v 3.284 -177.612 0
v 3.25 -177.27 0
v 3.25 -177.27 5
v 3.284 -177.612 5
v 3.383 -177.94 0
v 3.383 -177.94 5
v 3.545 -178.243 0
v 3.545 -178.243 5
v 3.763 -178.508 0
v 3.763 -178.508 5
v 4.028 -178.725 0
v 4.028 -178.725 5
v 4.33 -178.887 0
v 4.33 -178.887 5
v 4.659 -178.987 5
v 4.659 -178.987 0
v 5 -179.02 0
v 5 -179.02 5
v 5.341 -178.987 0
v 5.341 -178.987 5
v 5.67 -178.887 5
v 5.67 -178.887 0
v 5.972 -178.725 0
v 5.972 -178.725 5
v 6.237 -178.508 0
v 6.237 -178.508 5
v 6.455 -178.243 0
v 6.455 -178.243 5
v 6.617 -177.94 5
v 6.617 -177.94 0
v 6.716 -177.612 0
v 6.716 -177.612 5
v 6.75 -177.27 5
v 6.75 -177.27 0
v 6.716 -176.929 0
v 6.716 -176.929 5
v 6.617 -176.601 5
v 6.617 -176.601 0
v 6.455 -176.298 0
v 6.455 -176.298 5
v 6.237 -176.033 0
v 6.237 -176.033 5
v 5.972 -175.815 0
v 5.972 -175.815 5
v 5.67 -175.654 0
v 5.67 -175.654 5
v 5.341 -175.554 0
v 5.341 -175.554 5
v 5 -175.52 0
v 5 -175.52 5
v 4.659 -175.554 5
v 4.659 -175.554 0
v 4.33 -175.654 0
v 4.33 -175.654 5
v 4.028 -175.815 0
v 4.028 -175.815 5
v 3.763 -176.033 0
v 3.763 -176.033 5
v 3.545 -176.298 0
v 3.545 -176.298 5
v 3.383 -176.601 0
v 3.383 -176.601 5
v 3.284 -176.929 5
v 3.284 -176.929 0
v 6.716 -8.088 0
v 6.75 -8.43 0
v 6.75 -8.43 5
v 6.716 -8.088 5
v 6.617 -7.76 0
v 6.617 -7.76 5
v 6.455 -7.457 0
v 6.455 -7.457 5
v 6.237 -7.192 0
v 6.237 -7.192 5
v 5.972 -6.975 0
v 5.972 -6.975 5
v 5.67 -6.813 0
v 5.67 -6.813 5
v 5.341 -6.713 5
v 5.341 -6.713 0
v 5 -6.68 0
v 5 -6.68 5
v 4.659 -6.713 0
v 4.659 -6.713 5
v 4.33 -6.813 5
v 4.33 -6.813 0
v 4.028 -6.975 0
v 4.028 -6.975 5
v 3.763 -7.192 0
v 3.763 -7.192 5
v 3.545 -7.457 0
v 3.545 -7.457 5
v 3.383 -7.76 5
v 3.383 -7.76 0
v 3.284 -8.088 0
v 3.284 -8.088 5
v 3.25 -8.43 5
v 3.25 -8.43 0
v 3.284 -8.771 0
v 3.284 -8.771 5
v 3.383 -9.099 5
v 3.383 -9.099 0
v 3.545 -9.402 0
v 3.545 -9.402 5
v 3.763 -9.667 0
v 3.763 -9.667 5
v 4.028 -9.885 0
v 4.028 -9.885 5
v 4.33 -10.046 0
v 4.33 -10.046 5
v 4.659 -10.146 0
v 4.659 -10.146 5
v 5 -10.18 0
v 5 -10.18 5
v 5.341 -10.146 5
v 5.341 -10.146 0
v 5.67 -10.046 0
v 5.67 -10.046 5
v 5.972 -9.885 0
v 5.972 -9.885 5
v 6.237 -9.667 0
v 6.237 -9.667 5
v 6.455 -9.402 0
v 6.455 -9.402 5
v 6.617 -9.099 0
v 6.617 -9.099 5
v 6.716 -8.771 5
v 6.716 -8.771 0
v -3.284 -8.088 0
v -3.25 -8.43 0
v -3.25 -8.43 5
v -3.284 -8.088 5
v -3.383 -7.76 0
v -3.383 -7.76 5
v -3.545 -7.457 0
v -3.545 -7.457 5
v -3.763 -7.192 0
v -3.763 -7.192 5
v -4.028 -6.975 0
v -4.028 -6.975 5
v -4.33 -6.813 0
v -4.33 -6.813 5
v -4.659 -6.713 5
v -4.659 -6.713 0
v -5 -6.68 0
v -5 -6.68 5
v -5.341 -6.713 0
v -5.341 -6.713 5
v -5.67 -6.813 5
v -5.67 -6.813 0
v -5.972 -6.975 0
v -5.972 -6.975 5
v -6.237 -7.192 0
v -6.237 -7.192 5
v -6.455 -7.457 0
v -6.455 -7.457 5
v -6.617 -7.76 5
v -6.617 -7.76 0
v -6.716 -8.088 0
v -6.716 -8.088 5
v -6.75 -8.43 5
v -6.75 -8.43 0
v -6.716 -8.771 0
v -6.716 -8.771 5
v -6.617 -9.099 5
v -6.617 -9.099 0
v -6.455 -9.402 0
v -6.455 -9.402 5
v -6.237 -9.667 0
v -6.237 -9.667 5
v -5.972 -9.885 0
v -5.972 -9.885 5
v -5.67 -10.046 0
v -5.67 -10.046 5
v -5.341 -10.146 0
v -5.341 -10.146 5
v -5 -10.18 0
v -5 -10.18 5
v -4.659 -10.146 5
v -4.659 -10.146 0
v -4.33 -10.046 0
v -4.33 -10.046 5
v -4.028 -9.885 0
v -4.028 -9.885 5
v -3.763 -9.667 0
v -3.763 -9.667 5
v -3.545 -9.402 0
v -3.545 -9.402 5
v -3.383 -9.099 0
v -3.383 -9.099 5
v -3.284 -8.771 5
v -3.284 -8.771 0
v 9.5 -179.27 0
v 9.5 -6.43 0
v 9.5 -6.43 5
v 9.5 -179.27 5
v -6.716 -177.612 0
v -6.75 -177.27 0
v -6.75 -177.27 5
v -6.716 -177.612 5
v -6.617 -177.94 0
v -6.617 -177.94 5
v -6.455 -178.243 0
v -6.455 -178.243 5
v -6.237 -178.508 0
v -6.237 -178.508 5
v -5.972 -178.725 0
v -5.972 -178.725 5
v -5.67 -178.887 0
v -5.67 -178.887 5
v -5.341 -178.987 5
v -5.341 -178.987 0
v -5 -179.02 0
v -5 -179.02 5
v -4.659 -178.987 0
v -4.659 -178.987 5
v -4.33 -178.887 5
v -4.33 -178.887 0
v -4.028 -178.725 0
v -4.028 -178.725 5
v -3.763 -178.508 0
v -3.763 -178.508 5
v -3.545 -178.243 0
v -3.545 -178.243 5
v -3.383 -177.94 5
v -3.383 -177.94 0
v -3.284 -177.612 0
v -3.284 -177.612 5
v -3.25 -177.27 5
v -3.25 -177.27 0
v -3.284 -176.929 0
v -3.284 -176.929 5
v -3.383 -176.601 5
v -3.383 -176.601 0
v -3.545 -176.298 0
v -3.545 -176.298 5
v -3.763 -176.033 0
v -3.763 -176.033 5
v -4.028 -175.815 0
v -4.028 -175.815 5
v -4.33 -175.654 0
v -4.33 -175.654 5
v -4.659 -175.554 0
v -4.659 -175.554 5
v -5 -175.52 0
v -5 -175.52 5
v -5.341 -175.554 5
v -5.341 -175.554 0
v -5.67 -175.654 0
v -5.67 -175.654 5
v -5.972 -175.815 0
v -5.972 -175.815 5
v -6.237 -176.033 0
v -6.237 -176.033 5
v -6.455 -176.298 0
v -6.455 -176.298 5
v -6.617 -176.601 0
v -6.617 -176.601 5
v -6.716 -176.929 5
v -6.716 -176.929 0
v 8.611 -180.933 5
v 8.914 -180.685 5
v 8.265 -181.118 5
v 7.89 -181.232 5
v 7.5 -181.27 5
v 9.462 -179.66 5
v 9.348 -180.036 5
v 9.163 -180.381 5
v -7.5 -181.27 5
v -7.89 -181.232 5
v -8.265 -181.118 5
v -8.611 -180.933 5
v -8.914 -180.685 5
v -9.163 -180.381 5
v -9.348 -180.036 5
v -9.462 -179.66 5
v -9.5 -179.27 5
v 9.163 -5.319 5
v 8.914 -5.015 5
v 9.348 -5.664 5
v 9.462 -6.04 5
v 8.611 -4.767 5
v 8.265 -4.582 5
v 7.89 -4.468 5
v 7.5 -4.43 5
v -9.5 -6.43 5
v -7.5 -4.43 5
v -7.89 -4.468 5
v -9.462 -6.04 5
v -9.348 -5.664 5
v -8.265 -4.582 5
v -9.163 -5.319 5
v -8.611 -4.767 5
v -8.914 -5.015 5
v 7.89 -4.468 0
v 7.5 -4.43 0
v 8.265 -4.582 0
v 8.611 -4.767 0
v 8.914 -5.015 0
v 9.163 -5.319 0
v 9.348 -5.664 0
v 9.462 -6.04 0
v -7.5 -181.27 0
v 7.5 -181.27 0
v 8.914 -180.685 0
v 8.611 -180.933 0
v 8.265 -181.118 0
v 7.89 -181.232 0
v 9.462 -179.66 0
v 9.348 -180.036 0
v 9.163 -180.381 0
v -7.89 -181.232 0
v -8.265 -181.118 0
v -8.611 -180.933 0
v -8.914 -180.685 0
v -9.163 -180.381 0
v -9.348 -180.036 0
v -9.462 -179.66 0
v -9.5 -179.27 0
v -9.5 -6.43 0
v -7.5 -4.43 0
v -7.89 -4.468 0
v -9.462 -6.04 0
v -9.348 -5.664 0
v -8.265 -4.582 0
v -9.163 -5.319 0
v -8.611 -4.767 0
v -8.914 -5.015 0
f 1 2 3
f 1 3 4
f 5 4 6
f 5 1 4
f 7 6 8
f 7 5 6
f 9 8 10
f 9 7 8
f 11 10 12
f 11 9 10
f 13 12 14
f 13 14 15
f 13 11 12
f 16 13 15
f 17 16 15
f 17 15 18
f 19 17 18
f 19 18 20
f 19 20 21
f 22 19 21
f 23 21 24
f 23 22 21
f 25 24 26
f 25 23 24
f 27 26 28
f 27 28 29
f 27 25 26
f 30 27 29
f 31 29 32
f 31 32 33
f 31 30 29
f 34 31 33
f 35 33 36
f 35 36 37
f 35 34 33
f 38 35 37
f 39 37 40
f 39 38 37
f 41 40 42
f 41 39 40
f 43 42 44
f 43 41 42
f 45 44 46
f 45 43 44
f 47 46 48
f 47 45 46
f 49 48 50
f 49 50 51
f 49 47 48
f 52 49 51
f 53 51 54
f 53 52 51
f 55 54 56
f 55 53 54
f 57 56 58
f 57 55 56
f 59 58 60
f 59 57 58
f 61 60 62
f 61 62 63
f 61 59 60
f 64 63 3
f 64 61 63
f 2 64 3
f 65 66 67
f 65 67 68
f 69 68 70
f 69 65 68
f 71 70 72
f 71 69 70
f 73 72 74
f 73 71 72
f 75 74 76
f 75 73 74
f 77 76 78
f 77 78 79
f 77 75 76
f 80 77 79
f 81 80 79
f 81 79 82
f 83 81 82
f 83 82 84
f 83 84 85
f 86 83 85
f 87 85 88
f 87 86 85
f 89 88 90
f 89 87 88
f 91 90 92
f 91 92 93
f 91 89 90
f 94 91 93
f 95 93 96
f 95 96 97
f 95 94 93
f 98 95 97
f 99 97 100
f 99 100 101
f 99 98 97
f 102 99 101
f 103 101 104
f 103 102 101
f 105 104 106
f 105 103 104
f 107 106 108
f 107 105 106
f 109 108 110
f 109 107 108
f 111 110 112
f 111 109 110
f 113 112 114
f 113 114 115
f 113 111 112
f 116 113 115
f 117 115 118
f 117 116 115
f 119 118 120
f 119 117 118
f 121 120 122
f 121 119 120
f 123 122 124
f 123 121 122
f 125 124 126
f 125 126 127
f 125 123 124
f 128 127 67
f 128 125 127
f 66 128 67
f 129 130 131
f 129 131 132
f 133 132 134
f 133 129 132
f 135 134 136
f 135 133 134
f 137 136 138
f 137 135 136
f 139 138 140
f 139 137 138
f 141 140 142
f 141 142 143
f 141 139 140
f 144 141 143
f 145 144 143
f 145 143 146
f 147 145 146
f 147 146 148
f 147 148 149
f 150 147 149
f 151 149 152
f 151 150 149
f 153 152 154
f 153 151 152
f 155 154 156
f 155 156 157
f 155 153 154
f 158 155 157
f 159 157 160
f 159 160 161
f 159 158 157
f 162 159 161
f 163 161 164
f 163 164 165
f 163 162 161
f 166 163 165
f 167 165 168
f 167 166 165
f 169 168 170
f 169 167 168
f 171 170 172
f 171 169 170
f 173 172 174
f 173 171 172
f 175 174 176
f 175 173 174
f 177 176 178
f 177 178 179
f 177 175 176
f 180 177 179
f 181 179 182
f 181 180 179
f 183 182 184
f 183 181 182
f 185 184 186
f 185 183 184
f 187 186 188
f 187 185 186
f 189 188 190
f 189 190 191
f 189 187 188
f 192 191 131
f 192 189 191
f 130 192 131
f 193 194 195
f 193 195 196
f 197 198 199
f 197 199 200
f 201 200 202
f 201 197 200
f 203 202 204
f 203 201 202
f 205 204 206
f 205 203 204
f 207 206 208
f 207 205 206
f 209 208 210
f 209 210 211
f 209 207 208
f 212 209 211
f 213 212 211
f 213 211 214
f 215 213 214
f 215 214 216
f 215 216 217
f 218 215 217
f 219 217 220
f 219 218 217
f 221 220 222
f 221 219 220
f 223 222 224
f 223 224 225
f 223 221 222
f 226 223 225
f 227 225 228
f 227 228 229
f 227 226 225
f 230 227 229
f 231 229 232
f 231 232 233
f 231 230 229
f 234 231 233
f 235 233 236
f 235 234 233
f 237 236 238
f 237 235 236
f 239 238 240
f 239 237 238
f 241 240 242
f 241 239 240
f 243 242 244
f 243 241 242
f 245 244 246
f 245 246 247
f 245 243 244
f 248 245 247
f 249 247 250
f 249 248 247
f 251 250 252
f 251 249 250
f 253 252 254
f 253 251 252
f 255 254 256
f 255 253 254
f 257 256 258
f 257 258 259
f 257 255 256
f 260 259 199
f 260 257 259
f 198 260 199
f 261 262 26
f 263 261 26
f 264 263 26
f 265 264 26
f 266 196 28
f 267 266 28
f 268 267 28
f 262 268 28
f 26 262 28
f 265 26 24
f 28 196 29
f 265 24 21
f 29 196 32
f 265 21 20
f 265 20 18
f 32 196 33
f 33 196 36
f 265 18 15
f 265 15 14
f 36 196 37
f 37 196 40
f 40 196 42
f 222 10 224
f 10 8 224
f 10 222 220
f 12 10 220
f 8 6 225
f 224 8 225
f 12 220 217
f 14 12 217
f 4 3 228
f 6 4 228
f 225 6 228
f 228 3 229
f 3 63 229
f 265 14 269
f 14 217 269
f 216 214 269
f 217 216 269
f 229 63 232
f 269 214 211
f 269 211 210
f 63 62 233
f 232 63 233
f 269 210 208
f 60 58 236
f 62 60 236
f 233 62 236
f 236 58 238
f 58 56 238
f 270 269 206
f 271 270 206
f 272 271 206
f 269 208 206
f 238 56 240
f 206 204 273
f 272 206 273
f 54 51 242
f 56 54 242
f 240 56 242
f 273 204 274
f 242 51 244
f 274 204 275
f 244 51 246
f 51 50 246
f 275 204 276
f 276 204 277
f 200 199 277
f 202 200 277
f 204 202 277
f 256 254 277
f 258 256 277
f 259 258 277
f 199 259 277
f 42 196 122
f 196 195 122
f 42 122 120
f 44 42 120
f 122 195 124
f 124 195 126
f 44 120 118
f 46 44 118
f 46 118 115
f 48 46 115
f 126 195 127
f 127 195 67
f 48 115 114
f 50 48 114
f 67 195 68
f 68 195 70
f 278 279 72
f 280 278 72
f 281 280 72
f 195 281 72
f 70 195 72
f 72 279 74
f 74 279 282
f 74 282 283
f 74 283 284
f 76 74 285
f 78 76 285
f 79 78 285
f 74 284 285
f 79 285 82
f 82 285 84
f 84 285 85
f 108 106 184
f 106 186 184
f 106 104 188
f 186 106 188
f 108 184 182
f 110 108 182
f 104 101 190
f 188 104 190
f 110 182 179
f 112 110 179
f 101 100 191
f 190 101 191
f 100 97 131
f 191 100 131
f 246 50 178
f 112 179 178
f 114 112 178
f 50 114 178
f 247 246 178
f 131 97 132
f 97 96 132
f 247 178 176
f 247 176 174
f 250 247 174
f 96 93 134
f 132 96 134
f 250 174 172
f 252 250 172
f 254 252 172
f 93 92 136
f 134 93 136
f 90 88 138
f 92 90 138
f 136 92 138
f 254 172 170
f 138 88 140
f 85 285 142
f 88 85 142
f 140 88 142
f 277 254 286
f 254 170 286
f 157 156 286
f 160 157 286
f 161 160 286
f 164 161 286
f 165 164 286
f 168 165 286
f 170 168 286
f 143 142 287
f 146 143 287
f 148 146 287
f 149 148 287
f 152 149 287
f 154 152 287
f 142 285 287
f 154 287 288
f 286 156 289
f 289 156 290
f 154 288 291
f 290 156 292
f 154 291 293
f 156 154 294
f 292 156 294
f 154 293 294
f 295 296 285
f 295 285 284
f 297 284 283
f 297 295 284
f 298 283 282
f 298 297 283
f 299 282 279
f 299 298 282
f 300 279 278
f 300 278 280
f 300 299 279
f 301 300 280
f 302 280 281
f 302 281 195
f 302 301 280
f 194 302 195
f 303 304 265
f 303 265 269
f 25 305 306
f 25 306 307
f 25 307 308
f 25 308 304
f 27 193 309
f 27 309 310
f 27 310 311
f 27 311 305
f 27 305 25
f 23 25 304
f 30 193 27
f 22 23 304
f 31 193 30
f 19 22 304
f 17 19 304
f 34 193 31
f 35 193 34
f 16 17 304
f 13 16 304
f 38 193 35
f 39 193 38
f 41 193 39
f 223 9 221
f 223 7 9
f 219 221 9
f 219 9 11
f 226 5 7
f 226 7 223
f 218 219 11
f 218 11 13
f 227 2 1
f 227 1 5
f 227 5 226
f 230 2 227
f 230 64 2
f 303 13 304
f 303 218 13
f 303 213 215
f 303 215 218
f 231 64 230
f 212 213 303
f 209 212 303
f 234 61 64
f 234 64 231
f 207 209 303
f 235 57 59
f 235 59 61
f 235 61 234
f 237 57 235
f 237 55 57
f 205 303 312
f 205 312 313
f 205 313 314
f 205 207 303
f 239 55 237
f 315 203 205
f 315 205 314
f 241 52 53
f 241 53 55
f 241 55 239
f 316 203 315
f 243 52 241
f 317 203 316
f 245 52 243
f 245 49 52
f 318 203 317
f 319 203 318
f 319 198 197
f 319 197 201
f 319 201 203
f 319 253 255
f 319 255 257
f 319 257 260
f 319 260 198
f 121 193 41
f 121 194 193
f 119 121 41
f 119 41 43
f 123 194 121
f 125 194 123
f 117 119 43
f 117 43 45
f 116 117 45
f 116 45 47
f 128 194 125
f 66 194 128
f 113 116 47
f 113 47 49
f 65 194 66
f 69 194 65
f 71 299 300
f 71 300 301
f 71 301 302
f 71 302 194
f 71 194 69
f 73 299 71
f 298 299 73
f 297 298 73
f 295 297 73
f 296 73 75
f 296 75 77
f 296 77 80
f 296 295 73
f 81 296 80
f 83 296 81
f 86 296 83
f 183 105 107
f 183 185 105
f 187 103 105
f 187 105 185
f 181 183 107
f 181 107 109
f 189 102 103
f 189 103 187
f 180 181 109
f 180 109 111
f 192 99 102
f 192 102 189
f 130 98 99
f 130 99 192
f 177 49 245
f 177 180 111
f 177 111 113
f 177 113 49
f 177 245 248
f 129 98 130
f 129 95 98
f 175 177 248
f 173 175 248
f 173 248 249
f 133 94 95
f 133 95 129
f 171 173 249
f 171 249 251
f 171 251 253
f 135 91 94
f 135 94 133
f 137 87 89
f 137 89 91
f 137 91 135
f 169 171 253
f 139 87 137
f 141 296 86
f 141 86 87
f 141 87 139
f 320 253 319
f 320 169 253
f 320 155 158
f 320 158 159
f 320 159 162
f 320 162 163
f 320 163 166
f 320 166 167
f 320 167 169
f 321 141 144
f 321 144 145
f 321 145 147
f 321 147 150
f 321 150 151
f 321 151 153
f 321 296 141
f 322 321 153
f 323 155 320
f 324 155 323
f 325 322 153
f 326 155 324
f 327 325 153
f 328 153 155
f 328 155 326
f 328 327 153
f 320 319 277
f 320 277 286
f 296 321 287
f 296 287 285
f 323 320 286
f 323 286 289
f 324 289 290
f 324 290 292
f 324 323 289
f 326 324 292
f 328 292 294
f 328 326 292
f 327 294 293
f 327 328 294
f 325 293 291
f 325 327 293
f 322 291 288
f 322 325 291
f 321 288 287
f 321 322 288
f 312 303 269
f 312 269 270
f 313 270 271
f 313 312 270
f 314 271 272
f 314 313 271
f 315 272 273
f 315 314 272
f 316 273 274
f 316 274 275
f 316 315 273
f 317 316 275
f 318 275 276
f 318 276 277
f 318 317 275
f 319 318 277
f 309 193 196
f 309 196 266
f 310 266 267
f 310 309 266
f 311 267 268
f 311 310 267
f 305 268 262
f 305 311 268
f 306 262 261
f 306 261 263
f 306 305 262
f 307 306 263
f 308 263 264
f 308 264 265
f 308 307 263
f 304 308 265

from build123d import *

# Parameters (mm, degrees)
SKETCH1_R           = 1.75
BOSS_EXTRUDE1_DEPTH = 5


with BuildPart() as part:
    # Sketch1 → Boss-Extrude1 (new body)
    with BuildSketch(Plane.XY):
        with BuildLine():
            Line((-9.5, -179.270297721), (-9.5, -6.429702279))
            ThreePointArc((-9.5, -6.429702279), (-8.914213562, -5.015488716), (-7.5, -4.429702279))
            Line((-7.5, -4.429702279), (7.5, -4.429702279))
            ThreePointArc((7.5, -4.429702279), (8.914213562, -5.015488716), (9.5, -6.429702279))
            Line((9.5, -6.429702279), (9.5, -179.270297721))
            ThreePointArc((9.5, -179.270297721), (8.914213562, -180.684511284), (7.5, -181.270297721))
            Line((7.5, -181.270297721), (-7.5, -181.270297721))
            ThreePointArc((-7.5, -181.270297721), (-8.914213562, -180.684511284), (-9.5, -179.270297721))
        make_face()
        with Locations((5, -8.429702279)):
            Circle(SKETCH1_R, mode=Mode.SUBTRACT)
        with Locations((-5, -8.429702279)):
            Circle(SKETCH1_R, mode=Mode.SUBTRACT)
        with Locations(Location((-5, -177.270297721, 0), (0, 0, 180))):
            Circle(SKETCH1_R, mode=Mode.SUBTRACT)
        with Locations(Location((5, -177.270297721, 0), (0, 0, 180))):
            Circle(SKETCH1_R, mode=Mode.SUBTRACT)
    extrude(amount=BOSS_EXTRUDE1_DEPTH)


solid = part.part
